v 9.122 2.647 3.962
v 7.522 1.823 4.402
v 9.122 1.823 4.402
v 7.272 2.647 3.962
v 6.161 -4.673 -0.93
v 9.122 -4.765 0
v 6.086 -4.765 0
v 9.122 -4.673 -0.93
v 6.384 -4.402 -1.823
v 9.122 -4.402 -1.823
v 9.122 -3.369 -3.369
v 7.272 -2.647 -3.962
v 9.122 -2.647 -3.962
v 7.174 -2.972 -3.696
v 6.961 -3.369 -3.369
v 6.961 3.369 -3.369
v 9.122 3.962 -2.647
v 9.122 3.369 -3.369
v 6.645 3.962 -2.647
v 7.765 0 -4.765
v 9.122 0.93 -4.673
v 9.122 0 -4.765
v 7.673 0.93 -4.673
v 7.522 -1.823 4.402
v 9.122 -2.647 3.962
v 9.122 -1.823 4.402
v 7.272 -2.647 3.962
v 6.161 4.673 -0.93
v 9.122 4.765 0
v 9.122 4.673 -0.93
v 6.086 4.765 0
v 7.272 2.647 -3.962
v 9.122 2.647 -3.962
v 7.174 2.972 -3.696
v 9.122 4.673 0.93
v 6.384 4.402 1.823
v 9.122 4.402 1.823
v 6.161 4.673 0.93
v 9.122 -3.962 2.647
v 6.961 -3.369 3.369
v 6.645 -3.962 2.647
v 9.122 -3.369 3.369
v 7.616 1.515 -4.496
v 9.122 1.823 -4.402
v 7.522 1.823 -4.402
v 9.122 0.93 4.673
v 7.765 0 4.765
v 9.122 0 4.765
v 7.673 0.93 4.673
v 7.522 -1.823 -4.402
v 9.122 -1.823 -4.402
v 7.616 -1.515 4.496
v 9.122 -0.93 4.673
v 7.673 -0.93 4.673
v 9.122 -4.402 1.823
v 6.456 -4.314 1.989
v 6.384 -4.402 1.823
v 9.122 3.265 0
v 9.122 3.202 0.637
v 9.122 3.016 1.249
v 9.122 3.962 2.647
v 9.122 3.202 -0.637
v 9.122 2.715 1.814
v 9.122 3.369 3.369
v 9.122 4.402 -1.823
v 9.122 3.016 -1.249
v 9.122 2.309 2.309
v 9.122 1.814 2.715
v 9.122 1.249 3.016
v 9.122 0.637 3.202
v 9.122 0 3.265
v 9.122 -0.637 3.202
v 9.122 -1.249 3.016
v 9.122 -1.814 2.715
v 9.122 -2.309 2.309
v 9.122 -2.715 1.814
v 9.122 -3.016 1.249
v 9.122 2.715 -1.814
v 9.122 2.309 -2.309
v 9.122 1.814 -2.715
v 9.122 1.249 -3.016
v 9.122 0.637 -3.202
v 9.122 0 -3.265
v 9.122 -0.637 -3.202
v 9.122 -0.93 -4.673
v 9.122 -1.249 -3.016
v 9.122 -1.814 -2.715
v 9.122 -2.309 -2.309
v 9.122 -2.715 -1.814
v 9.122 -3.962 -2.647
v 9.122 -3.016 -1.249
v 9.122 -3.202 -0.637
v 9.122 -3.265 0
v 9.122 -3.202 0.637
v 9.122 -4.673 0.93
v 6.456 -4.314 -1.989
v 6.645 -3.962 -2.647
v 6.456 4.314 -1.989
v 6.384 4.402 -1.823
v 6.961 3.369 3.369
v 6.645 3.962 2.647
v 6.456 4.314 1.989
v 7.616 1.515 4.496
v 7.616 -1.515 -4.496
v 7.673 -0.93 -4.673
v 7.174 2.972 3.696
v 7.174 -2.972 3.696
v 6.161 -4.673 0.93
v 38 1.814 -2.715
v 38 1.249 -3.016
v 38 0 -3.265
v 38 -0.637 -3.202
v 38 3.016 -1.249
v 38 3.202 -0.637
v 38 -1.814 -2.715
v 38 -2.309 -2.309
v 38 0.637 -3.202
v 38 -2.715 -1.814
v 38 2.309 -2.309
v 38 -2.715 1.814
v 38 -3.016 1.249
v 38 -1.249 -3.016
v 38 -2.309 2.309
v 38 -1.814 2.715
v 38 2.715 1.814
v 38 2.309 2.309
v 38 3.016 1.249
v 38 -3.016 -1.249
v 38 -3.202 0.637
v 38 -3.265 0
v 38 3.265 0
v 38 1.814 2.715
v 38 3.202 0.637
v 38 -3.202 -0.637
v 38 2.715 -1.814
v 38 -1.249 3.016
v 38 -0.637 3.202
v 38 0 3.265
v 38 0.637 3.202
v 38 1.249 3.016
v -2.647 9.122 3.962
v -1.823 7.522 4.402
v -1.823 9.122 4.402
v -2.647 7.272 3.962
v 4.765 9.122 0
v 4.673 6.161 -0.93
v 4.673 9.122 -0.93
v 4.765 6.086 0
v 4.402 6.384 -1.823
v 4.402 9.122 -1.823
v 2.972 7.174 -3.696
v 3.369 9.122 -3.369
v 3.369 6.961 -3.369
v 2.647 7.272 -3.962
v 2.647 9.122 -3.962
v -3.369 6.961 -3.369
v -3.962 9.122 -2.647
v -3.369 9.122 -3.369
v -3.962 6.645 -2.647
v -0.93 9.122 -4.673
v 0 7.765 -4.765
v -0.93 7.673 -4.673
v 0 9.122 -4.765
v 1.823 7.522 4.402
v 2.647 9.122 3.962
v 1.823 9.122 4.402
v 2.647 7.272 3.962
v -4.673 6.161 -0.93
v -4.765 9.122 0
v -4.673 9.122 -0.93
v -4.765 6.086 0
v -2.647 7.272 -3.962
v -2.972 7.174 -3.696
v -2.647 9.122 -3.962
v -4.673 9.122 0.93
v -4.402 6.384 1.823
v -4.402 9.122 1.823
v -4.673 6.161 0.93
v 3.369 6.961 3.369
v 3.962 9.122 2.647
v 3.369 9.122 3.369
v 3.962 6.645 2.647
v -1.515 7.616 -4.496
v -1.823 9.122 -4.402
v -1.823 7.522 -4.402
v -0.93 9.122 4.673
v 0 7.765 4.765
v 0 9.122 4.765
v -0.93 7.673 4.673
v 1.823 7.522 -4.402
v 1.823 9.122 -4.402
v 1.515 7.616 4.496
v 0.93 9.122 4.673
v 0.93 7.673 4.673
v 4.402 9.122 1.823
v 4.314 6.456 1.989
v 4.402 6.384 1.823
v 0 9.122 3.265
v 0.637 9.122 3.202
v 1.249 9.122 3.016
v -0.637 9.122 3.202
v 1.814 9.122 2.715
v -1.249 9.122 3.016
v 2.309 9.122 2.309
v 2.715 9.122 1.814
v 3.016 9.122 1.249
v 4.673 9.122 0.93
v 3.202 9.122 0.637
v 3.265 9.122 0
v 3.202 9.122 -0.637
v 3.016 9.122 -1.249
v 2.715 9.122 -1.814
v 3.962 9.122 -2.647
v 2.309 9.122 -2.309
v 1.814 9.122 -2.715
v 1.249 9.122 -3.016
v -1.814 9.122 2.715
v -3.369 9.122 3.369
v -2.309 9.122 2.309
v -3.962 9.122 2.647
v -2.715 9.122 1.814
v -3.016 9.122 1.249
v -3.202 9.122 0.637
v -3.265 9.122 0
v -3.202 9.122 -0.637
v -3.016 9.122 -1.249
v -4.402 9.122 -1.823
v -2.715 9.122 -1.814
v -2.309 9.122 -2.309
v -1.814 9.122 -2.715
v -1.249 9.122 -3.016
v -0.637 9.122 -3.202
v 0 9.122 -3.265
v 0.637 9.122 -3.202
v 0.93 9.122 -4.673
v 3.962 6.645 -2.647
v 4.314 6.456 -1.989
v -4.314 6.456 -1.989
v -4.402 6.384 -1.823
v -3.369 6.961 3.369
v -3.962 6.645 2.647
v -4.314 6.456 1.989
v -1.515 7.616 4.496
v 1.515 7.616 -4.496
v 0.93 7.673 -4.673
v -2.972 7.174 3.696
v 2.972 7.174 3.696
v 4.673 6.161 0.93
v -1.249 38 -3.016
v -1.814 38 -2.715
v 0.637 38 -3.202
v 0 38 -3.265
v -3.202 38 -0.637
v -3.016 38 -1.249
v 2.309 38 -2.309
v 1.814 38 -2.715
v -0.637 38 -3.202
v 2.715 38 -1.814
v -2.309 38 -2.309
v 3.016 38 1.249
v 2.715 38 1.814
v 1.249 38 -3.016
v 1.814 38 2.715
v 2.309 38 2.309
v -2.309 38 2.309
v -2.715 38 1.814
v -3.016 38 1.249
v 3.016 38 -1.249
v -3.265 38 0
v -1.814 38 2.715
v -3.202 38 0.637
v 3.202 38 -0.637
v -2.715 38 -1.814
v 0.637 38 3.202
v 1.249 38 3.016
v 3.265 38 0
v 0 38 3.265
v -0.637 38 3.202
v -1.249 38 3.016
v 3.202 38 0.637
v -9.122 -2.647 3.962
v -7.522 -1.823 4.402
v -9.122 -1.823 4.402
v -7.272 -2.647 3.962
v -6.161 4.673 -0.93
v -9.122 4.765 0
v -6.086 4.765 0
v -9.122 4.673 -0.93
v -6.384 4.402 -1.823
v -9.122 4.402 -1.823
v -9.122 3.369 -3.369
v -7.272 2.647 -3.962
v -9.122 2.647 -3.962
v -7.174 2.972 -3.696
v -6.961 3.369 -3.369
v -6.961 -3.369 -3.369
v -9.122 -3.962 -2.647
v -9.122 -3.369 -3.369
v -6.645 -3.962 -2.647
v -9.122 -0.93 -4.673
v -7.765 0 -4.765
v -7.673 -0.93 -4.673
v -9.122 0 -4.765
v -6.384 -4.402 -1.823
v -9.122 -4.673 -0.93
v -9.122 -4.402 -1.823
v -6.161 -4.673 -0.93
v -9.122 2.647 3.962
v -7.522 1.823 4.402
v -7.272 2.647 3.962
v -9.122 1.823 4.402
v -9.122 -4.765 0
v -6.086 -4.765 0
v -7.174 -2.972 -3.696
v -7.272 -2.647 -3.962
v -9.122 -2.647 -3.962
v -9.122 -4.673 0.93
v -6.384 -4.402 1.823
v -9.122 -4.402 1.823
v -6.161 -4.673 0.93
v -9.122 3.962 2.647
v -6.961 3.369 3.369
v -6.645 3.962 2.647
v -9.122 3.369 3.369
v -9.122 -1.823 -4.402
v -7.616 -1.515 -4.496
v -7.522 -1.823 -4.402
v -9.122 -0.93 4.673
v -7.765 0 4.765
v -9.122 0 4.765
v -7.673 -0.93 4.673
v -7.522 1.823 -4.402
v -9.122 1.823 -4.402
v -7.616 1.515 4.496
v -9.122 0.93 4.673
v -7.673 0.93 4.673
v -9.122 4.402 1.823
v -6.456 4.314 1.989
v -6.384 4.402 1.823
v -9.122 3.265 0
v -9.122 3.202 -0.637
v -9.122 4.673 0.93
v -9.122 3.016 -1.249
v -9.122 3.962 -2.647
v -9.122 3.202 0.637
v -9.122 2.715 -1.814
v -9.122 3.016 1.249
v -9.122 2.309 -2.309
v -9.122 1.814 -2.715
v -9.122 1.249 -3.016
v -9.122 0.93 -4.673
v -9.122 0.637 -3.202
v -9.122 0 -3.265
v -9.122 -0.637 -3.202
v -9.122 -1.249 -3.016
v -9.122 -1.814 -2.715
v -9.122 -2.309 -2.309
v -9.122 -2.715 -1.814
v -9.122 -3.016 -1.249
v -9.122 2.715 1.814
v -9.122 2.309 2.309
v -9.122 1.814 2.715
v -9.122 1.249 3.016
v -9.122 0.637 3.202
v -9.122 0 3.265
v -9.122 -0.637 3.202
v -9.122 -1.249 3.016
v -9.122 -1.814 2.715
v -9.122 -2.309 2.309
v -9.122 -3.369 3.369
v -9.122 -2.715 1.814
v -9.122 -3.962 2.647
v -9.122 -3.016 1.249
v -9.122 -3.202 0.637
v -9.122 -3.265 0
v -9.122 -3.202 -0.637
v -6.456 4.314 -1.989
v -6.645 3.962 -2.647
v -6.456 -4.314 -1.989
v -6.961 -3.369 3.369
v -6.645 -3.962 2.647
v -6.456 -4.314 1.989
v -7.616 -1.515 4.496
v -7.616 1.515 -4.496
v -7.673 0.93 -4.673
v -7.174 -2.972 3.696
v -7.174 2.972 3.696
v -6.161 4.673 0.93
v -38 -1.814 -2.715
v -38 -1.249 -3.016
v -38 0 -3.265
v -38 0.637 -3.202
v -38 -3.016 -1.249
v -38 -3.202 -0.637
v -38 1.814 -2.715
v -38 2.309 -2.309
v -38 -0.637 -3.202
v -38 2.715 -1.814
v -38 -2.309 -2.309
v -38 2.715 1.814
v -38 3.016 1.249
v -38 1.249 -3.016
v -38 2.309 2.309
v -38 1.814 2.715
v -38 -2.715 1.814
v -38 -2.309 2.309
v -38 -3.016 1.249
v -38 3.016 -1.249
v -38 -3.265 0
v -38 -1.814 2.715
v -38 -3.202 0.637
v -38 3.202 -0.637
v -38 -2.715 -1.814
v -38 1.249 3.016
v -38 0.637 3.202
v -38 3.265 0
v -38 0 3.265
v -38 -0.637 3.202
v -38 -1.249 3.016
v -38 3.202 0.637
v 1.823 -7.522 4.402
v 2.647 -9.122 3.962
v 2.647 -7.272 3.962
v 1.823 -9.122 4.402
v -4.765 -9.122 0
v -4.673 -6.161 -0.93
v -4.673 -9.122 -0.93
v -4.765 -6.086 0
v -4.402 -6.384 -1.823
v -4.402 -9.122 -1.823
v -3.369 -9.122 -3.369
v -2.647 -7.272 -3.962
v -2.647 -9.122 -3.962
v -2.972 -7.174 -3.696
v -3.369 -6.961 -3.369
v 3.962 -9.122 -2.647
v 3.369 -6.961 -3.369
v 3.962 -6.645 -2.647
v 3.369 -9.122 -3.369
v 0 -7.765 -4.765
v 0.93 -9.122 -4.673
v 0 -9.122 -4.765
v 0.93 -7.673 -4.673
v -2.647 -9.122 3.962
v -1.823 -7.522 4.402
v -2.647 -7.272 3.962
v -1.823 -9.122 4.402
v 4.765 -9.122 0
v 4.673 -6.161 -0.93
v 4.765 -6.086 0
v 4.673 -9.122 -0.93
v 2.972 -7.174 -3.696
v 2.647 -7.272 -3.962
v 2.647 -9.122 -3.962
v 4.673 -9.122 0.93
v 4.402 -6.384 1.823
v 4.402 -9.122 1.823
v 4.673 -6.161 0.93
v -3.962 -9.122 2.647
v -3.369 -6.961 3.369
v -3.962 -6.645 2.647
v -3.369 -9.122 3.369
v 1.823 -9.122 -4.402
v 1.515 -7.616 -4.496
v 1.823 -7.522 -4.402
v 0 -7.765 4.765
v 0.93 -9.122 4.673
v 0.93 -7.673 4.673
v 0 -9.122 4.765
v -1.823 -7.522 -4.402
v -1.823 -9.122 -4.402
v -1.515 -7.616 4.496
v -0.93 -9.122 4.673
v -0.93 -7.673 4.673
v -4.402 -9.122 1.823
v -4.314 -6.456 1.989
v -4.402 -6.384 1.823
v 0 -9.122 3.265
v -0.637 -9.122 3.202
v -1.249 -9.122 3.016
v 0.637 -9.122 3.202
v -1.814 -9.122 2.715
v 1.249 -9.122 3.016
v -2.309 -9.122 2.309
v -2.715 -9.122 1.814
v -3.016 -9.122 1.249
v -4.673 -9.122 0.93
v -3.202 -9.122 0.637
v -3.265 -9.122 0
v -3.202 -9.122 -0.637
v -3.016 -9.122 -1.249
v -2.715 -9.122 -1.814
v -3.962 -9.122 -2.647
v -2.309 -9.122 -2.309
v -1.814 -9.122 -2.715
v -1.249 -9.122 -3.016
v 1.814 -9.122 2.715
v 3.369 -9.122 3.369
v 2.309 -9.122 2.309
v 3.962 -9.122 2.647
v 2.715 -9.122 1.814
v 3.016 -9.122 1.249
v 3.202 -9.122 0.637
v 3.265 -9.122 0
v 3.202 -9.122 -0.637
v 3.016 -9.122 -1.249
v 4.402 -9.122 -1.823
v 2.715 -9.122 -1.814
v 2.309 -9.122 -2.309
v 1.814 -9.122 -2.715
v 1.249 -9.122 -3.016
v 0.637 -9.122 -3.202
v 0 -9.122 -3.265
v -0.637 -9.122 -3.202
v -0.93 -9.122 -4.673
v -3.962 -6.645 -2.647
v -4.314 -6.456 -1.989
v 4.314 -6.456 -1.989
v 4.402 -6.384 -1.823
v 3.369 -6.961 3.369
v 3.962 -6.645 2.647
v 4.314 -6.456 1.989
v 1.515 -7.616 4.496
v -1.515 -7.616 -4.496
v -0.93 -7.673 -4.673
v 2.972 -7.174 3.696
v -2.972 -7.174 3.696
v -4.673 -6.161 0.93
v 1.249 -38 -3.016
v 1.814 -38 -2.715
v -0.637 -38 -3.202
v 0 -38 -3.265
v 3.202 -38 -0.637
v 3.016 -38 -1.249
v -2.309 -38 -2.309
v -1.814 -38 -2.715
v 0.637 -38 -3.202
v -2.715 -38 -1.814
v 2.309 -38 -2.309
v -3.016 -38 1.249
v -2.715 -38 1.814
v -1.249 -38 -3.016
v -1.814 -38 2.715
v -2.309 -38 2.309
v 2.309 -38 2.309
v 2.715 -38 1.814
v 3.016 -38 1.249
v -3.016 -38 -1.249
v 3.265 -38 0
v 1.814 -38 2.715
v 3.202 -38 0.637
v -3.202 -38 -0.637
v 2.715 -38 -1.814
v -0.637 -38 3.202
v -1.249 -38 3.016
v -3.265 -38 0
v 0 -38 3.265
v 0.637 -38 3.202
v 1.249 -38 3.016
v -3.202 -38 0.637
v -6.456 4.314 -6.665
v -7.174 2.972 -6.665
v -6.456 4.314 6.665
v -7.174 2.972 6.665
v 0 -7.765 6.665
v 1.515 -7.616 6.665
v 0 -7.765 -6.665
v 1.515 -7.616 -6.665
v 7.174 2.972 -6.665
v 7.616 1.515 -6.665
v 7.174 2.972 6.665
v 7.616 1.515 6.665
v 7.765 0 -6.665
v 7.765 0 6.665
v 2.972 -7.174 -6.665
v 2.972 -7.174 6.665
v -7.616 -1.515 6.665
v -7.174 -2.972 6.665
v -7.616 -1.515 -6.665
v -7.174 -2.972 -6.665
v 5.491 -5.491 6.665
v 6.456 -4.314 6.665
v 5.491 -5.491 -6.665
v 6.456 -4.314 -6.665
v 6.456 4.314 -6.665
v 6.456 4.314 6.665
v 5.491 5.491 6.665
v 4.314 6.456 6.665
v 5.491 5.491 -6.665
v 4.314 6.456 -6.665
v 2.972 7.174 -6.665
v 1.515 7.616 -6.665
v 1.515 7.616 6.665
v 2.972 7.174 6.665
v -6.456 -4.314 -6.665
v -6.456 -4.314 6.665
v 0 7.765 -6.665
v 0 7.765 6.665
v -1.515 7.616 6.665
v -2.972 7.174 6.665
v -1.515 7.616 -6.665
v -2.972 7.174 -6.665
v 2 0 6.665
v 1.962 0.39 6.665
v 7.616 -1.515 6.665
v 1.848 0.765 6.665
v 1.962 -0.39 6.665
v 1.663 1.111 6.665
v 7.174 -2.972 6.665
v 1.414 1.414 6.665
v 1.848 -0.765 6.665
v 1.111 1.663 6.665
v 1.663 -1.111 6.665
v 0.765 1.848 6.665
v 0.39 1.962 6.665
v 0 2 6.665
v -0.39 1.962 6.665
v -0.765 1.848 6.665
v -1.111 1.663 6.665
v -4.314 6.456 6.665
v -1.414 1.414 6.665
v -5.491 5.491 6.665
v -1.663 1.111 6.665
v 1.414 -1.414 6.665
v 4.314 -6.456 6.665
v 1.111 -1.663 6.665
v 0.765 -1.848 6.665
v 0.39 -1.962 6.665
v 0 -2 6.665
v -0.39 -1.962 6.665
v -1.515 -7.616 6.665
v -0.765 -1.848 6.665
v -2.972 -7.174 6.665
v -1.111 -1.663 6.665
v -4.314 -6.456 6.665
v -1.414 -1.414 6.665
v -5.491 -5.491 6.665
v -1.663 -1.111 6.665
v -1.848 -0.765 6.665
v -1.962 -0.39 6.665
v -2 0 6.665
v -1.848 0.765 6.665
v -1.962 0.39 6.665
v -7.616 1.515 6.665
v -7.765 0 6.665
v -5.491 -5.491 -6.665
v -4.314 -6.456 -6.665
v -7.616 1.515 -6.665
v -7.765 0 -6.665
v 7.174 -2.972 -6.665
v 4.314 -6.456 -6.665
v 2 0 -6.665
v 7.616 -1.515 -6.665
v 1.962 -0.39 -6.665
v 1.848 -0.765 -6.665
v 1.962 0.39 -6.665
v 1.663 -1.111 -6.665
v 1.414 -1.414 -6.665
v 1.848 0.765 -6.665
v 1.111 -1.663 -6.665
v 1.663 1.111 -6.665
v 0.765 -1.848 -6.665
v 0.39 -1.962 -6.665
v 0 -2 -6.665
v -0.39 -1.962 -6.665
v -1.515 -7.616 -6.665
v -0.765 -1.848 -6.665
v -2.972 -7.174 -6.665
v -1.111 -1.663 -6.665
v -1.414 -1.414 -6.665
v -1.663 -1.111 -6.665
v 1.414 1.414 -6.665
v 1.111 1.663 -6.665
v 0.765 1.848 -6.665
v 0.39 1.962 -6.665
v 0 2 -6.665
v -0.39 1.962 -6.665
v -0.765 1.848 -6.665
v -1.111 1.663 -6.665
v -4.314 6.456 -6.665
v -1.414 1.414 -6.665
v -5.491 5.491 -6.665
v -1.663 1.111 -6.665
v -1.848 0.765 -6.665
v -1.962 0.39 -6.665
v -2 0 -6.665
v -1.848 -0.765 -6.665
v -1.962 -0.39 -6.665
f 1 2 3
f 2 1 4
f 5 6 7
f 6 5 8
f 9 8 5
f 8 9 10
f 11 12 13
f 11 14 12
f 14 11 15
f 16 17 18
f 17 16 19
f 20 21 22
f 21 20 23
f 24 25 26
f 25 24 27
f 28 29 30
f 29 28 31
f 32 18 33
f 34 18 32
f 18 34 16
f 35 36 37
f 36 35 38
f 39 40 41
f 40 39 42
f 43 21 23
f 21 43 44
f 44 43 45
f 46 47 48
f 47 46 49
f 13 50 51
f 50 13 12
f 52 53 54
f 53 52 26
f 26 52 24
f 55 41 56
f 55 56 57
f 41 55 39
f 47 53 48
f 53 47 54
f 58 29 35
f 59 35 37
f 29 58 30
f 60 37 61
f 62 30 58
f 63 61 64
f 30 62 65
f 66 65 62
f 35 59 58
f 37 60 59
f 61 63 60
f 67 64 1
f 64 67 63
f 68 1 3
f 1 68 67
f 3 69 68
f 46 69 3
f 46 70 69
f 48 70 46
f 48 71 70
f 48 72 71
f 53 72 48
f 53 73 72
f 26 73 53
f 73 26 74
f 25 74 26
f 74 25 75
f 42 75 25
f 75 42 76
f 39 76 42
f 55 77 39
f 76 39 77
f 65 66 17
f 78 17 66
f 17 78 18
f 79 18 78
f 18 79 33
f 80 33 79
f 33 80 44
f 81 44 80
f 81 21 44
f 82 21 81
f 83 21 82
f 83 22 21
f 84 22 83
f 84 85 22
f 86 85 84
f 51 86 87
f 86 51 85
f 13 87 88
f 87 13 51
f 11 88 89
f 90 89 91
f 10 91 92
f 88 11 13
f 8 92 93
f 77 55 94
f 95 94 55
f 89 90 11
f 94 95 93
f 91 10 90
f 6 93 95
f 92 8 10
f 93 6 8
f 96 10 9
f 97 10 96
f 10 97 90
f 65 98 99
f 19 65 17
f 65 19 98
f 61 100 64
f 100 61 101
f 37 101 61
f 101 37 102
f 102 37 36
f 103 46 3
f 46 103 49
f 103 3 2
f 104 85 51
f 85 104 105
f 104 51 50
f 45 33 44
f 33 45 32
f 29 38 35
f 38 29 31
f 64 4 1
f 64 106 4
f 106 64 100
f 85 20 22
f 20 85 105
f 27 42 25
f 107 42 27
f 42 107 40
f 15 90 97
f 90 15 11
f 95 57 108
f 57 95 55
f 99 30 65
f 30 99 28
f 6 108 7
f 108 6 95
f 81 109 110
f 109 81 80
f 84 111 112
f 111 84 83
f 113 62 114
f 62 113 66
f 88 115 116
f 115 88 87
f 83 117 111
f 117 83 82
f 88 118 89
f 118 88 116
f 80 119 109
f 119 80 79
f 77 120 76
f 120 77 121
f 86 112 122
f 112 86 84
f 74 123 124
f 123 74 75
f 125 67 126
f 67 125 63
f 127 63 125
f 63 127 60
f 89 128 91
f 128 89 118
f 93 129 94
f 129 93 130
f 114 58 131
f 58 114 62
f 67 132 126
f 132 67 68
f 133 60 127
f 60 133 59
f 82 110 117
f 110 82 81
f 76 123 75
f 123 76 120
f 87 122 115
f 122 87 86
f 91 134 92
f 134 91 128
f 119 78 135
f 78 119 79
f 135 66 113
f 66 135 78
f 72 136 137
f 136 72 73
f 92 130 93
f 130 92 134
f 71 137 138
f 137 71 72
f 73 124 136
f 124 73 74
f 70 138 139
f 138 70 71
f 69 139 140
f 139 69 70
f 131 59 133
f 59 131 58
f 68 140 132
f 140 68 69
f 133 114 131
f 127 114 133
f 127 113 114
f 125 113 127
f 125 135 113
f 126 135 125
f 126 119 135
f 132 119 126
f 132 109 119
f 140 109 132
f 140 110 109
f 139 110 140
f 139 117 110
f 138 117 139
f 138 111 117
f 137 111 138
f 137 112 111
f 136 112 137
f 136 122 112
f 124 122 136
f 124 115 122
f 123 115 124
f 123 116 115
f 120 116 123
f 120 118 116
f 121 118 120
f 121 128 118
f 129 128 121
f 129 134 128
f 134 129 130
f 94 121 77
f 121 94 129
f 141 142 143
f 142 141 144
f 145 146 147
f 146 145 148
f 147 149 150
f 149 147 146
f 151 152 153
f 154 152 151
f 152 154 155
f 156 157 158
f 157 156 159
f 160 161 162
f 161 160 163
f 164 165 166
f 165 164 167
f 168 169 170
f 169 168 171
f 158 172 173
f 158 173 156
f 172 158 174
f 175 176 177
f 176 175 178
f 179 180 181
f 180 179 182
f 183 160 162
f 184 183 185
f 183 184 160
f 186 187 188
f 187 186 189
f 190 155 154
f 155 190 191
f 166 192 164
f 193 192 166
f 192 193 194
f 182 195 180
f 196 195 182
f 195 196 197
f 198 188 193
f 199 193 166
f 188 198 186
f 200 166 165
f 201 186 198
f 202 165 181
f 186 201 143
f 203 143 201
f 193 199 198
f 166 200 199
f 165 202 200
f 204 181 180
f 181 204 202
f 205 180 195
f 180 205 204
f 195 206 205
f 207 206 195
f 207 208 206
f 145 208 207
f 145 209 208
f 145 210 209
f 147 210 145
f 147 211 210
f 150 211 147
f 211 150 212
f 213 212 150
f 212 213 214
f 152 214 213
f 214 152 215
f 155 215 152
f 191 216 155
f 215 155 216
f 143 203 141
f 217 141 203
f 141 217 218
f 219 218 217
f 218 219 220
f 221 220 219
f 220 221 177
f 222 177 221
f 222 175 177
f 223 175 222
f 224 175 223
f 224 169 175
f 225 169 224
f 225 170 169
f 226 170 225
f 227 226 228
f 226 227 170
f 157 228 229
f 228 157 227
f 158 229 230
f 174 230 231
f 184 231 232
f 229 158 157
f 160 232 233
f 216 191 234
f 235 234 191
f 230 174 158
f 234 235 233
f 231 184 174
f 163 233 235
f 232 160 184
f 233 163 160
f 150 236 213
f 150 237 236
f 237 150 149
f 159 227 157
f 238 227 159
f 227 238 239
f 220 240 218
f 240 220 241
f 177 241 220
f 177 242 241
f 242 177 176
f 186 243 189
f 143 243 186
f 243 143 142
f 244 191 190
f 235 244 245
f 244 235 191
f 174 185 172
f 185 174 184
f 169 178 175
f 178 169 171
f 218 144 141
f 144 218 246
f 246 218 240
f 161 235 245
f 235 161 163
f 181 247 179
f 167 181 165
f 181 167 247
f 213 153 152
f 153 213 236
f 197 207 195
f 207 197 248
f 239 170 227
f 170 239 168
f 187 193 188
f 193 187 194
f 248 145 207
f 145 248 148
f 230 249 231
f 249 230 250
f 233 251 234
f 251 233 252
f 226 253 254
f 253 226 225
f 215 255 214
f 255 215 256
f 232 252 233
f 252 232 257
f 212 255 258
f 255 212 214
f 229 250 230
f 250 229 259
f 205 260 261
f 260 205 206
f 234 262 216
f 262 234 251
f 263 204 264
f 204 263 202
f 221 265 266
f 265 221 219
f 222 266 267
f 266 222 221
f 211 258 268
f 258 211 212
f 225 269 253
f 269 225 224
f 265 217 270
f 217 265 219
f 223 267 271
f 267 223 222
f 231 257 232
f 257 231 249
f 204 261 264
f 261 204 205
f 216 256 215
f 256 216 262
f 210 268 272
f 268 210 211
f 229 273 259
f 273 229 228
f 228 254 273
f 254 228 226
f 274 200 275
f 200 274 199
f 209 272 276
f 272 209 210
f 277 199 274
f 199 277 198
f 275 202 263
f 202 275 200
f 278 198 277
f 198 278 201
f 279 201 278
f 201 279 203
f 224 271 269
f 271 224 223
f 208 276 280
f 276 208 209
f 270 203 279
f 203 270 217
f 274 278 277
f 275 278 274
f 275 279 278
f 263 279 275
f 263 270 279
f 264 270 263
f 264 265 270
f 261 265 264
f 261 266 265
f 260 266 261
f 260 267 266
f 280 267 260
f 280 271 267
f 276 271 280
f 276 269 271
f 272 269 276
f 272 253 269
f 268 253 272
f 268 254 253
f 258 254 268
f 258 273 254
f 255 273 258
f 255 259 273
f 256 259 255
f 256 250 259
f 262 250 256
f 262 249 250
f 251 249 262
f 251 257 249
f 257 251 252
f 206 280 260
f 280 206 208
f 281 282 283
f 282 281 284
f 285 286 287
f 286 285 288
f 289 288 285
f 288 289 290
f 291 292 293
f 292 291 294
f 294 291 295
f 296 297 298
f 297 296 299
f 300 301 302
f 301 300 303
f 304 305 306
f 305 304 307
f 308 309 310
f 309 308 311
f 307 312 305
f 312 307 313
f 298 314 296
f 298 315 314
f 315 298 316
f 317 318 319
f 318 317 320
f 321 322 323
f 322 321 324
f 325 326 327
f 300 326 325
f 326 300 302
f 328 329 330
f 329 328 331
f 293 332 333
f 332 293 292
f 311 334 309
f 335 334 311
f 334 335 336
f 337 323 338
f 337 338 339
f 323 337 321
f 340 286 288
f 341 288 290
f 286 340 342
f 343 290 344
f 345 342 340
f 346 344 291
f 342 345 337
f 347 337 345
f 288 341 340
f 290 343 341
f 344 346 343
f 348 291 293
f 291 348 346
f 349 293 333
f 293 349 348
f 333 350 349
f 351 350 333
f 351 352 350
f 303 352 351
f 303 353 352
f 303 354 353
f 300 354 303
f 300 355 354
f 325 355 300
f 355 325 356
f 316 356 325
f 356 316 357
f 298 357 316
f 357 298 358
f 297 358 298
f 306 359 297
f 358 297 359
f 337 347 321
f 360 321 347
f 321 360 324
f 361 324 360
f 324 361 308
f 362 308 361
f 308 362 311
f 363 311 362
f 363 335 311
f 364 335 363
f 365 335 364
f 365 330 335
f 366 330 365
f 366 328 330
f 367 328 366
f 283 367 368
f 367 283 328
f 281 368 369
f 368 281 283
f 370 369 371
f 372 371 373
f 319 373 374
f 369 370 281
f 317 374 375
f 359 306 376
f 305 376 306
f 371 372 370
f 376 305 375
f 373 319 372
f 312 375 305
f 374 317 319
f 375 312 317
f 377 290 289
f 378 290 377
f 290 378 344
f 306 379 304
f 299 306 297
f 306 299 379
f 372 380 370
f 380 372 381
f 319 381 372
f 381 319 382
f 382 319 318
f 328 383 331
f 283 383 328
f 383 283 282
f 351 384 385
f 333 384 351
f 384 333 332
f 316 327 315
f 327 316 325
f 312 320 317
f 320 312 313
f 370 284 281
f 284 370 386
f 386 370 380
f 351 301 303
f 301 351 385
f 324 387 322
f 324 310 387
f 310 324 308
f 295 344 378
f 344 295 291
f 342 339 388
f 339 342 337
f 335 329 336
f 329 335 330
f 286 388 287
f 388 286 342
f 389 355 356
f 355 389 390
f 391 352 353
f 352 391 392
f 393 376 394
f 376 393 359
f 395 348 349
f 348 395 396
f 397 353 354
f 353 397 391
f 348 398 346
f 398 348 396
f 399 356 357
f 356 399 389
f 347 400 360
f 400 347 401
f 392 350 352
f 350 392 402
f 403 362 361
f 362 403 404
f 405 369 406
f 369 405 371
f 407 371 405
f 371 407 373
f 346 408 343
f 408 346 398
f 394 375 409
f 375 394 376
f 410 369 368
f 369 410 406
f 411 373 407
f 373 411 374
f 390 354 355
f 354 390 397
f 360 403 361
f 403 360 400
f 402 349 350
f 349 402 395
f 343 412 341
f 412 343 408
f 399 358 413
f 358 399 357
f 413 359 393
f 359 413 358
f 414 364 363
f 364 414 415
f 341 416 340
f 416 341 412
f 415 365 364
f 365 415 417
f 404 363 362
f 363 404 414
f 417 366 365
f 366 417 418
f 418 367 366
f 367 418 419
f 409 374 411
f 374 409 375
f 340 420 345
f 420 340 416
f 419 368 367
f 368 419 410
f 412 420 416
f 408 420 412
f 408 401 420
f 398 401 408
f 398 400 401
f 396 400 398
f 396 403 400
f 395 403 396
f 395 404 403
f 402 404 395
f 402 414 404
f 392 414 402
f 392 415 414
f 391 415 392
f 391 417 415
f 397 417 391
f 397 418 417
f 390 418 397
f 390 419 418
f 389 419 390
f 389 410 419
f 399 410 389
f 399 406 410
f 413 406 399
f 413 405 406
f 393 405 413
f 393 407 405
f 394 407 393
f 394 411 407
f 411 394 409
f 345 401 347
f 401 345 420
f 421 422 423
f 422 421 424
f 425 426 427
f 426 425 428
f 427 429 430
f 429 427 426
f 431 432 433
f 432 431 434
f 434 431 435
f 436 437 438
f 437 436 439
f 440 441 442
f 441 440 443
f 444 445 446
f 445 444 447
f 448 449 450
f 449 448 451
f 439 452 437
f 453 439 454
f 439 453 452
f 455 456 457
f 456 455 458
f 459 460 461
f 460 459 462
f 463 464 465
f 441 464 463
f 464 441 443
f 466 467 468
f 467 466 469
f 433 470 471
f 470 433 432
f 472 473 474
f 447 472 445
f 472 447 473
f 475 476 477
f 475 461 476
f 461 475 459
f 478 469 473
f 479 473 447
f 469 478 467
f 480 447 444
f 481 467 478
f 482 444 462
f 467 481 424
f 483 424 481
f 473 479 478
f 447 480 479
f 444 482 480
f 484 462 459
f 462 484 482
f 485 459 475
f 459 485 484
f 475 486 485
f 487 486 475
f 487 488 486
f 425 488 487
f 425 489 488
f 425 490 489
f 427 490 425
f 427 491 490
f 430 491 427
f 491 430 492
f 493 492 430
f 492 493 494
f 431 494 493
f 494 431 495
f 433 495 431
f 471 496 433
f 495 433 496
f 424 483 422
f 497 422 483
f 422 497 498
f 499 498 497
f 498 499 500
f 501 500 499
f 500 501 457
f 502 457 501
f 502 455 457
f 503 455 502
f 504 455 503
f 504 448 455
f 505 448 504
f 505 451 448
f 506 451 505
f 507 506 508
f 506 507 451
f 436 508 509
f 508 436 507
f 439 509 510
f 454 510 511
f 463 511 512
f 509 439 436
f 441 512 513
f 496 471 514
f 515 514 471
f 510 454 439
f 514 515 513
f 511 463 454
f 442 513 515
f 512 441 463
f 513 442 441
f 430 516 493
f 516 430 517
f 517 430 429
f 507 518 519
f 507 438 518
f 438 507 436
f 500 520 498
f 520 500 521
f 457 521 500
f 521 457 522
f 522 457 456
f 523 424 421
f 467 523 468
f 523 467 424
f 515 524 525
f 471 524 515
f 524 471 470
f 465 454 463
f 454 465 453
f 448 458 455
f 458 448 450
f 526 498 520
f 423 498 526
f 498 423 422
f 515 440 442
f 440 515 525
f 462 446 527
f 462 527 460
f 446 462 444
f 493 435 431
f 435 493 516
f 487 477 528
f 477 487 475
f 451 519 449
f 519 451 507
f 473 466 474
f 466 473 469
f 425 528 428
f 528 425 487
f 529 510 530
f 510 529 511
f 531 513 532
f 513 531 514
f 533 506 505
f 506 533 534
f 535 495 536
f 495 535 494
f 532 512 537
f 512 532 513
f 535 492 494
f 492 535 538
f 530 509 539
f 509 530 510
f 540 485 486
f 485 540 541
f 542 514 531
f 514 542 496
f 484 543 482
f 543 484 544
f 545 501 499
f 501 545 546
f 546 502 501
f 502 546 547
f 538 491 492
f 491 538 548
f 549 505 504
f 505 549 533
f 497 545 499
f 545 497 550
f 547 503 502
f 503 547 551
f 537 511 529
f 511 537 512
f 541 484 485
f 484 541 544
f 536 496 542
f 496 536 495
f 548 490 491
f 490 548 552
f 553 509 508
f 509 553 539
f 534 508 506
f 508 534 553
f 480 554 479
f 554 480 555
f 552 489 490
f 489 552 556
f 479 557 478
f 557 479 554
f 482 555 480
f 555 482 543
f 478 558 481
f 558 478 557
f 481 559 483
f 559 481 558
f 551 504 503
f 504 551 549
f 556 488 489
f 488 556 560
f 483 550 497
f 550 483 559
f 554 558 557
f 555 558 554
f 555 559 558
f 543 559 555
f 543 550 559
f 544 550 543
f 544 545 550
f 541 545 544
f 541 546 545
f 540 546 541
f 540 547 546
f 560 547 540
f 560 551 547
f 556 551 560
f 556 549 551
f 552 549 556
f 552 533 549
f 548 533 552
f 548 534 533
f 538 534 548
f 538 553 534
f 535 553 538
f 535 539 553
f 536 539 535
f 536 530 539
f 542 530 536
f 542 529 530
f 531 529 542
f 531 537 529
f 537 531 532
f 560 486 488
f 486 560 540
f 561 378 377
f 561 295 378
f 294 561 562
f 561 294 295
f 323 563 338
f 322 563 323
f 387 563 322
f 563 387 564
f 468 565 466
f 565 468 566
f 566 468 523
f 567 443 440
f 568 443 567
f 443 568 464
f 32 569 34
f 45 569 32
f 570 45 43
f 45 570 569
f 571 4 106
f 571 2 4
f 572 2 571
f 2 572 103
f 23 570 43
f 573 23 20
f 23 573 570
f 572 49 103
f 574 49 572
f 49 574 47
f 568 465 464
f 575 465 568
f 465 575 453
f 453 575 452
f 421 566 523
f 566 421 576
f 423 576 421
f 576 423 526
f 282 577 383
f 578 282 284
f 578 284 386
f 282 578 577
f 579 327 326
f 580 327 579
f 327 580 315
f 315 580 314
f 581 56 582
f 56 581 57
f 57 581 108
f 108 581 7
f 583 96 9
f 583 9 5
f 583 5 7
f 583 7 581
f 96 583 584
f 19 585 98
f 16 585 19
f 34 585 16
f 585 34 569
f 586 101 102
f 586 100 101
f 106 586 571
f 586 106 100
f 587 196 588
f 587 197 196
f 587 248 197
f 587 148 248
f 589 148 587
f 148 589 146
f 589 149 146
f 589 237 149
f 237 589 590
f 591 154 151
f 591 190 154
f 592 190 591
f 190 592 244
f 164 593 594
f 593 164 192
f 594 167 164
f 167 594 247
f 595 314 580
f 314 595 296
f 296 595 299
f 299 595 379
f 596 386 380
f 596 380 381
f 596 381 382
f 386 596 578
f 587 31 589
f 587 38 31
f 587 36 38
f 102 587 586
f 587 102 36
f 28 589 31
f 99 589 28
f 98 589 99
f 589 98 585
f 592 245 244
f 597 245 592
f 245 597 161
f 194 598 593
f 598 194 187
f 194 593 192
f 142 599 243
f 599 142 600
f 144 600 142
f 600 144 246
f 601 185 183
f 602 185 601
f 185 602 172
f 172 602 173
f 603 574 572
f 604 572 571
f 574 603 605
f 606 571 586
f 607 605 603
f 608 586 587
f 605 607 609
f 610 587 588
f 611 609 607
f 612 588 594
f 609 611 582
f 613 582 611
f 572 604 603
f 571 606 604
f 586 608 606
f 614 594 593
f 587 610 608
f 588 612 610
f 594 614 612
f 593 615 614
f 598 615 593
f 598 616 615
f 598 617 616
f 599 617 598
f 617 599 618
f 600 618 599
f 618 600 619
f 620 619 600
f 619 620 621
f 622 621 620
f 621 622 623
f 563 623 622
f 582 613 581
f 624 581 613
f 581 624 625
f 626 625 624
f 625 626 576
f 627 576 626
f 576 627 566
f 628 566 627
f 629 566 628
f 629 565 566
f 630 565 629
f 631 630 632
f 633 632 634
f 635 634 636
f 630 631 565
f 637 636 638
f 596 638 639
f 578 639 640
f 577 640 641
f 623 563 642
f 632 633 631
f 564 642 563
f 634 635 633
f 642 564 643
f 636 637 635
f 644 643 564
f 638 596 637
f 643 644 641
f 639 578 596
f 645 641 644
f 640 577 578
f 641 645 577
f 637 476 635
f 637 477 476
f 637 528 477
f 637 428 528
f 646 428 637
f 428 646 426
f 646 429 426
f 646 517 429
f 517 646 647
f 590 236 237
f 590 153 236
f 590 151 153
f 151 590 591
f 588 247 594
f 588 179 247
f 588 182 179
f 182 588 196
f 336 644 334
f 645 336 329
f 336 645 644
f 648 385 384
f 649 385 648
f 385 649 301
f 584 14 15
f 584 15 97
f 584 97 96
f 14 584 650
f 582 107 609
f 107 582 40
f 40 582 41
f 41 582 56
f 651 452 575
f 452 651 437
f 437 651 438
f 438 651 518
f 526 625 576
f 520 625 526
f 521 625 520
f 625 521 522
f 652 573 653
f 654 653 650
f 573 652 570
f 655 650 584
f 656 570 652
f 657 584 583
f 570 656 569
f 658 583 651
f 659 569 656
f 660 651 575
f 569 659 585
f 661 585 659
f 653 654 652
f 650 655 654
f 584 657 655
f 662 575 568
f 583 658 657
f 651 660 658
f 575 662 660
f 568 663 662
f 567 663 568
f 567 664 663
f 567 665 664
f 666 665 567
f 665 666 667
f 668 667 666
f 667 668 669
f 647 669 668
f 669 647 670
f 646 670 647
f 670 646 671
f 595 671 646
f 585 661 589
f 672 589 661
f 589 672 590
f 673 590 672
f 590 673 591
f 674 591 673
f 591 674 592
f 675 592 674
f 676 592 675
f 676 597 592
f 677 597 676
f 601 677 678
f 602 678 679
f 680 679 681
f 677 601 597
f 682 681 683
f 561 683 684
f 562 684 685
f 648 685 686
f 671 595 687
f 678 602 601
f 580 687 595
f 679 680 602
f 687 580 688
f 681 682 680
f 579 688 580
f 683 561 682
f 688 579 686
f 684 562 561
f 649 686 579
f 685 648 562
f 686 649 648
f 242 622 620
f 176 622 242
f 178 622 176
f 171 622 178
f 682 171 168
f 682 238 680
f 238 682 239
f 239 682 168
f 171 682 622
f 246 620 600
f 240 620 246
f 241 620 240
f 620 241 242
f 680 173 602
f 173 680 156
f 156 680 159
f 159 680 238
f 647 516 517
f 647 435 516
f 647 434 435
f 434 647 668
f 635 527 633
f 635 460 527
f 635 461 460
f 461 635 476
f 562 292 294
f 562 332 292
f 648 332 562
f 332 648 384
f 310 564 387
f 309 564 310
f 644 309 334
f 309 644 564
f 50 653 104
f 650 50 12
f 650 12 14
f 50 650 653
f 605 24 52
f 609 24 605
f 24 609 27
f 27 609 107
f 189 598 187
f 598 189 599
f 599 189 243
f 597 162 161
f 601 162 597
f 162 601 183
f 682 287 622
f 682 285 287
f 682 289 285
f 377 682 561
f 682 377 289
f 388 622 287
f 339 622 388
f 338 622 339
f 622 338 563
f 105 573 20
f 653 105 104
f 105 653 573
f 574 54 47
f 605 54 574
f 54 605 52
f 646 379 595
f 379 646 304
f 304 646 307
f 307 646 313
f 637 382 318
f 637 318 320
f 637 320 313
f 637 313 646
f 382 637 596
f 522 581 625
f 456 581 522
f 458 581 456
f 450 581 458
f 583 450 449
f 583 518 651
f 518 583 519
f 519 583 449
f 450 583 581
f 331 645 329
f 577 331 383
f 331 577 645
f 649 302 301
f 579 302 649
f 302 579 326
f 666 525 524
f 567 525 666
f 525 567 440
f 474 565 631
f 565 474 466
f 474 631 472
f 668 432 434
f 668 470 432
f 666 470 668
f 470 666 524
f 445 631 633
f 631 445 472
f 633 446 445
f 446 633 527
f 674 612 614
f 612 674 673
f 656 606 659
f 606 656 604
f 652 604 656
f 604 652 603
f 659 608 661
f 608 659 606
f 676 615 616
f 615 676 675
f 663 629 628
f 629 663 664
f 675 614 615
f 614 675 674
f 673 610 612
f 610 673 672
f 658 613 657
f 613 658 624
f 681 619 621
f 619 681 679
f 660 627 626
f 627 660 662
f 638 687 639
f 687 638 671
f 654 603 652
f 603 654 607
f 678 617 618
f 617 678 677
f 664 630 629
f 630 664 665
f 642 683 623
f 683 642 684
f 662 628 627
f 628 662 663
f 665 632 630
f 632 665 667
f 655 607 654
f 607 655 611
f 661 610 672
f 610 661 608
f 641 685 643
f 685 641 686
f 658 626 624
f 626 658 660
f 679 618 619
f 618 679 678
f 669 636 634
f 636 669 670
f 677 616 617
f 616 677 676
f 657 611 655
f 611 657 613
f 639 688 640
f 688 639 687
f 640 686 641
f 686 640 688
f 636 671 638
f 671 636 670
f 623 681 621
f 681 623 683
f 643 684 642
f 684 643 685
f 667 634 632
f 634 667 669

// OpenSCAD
$fn = 32;

// ----------------------------------------------------------------------
// Cardan cross: 76 mm span, 9.53 mm trunnions
// ----------------------------------------------------------------------

// --- parameters (mm) ---
journal_d = 9.53;         // trunnion diameter
arm_len = 38;             // trunnion length from the centre
step_r = 3.24;            // step position from the centre
step_d = 6.53;            // journal diameter after the step
hub_d = 15.53;            // hub diameter
hub_h = 13.33;            // hub height
bore_d = 4;               // hub bore

difference() {
  union() {
    /* hub along the joint axis */
    cylinder(h = hub_h, d = hub_d, center = true);
    for (a = [0 : 90 : 270]) rotate([0, 0, a]) {
      /* trunnion, sunk into the hub */
      translate([hub_d / 4, 0, 0]) rotate([0, 90, 0]) cylinder(h = step_r + 2, d = journal_d);
      /* stepped journal out to the tip */
      translate([step_r - 0.5, 0, 0]) rotate([0, 90, 0]) cylinder(h = arm_len + 0.5 - step_r, d = step_d);
    }
  }
  /* lubrication bore through the hub, 2.5 mm clear on both sides */
  translate([0, 0, -hub_h / 2 - 2.5]) cylinder(h = hub_h + 5, d = bore_d);
}
